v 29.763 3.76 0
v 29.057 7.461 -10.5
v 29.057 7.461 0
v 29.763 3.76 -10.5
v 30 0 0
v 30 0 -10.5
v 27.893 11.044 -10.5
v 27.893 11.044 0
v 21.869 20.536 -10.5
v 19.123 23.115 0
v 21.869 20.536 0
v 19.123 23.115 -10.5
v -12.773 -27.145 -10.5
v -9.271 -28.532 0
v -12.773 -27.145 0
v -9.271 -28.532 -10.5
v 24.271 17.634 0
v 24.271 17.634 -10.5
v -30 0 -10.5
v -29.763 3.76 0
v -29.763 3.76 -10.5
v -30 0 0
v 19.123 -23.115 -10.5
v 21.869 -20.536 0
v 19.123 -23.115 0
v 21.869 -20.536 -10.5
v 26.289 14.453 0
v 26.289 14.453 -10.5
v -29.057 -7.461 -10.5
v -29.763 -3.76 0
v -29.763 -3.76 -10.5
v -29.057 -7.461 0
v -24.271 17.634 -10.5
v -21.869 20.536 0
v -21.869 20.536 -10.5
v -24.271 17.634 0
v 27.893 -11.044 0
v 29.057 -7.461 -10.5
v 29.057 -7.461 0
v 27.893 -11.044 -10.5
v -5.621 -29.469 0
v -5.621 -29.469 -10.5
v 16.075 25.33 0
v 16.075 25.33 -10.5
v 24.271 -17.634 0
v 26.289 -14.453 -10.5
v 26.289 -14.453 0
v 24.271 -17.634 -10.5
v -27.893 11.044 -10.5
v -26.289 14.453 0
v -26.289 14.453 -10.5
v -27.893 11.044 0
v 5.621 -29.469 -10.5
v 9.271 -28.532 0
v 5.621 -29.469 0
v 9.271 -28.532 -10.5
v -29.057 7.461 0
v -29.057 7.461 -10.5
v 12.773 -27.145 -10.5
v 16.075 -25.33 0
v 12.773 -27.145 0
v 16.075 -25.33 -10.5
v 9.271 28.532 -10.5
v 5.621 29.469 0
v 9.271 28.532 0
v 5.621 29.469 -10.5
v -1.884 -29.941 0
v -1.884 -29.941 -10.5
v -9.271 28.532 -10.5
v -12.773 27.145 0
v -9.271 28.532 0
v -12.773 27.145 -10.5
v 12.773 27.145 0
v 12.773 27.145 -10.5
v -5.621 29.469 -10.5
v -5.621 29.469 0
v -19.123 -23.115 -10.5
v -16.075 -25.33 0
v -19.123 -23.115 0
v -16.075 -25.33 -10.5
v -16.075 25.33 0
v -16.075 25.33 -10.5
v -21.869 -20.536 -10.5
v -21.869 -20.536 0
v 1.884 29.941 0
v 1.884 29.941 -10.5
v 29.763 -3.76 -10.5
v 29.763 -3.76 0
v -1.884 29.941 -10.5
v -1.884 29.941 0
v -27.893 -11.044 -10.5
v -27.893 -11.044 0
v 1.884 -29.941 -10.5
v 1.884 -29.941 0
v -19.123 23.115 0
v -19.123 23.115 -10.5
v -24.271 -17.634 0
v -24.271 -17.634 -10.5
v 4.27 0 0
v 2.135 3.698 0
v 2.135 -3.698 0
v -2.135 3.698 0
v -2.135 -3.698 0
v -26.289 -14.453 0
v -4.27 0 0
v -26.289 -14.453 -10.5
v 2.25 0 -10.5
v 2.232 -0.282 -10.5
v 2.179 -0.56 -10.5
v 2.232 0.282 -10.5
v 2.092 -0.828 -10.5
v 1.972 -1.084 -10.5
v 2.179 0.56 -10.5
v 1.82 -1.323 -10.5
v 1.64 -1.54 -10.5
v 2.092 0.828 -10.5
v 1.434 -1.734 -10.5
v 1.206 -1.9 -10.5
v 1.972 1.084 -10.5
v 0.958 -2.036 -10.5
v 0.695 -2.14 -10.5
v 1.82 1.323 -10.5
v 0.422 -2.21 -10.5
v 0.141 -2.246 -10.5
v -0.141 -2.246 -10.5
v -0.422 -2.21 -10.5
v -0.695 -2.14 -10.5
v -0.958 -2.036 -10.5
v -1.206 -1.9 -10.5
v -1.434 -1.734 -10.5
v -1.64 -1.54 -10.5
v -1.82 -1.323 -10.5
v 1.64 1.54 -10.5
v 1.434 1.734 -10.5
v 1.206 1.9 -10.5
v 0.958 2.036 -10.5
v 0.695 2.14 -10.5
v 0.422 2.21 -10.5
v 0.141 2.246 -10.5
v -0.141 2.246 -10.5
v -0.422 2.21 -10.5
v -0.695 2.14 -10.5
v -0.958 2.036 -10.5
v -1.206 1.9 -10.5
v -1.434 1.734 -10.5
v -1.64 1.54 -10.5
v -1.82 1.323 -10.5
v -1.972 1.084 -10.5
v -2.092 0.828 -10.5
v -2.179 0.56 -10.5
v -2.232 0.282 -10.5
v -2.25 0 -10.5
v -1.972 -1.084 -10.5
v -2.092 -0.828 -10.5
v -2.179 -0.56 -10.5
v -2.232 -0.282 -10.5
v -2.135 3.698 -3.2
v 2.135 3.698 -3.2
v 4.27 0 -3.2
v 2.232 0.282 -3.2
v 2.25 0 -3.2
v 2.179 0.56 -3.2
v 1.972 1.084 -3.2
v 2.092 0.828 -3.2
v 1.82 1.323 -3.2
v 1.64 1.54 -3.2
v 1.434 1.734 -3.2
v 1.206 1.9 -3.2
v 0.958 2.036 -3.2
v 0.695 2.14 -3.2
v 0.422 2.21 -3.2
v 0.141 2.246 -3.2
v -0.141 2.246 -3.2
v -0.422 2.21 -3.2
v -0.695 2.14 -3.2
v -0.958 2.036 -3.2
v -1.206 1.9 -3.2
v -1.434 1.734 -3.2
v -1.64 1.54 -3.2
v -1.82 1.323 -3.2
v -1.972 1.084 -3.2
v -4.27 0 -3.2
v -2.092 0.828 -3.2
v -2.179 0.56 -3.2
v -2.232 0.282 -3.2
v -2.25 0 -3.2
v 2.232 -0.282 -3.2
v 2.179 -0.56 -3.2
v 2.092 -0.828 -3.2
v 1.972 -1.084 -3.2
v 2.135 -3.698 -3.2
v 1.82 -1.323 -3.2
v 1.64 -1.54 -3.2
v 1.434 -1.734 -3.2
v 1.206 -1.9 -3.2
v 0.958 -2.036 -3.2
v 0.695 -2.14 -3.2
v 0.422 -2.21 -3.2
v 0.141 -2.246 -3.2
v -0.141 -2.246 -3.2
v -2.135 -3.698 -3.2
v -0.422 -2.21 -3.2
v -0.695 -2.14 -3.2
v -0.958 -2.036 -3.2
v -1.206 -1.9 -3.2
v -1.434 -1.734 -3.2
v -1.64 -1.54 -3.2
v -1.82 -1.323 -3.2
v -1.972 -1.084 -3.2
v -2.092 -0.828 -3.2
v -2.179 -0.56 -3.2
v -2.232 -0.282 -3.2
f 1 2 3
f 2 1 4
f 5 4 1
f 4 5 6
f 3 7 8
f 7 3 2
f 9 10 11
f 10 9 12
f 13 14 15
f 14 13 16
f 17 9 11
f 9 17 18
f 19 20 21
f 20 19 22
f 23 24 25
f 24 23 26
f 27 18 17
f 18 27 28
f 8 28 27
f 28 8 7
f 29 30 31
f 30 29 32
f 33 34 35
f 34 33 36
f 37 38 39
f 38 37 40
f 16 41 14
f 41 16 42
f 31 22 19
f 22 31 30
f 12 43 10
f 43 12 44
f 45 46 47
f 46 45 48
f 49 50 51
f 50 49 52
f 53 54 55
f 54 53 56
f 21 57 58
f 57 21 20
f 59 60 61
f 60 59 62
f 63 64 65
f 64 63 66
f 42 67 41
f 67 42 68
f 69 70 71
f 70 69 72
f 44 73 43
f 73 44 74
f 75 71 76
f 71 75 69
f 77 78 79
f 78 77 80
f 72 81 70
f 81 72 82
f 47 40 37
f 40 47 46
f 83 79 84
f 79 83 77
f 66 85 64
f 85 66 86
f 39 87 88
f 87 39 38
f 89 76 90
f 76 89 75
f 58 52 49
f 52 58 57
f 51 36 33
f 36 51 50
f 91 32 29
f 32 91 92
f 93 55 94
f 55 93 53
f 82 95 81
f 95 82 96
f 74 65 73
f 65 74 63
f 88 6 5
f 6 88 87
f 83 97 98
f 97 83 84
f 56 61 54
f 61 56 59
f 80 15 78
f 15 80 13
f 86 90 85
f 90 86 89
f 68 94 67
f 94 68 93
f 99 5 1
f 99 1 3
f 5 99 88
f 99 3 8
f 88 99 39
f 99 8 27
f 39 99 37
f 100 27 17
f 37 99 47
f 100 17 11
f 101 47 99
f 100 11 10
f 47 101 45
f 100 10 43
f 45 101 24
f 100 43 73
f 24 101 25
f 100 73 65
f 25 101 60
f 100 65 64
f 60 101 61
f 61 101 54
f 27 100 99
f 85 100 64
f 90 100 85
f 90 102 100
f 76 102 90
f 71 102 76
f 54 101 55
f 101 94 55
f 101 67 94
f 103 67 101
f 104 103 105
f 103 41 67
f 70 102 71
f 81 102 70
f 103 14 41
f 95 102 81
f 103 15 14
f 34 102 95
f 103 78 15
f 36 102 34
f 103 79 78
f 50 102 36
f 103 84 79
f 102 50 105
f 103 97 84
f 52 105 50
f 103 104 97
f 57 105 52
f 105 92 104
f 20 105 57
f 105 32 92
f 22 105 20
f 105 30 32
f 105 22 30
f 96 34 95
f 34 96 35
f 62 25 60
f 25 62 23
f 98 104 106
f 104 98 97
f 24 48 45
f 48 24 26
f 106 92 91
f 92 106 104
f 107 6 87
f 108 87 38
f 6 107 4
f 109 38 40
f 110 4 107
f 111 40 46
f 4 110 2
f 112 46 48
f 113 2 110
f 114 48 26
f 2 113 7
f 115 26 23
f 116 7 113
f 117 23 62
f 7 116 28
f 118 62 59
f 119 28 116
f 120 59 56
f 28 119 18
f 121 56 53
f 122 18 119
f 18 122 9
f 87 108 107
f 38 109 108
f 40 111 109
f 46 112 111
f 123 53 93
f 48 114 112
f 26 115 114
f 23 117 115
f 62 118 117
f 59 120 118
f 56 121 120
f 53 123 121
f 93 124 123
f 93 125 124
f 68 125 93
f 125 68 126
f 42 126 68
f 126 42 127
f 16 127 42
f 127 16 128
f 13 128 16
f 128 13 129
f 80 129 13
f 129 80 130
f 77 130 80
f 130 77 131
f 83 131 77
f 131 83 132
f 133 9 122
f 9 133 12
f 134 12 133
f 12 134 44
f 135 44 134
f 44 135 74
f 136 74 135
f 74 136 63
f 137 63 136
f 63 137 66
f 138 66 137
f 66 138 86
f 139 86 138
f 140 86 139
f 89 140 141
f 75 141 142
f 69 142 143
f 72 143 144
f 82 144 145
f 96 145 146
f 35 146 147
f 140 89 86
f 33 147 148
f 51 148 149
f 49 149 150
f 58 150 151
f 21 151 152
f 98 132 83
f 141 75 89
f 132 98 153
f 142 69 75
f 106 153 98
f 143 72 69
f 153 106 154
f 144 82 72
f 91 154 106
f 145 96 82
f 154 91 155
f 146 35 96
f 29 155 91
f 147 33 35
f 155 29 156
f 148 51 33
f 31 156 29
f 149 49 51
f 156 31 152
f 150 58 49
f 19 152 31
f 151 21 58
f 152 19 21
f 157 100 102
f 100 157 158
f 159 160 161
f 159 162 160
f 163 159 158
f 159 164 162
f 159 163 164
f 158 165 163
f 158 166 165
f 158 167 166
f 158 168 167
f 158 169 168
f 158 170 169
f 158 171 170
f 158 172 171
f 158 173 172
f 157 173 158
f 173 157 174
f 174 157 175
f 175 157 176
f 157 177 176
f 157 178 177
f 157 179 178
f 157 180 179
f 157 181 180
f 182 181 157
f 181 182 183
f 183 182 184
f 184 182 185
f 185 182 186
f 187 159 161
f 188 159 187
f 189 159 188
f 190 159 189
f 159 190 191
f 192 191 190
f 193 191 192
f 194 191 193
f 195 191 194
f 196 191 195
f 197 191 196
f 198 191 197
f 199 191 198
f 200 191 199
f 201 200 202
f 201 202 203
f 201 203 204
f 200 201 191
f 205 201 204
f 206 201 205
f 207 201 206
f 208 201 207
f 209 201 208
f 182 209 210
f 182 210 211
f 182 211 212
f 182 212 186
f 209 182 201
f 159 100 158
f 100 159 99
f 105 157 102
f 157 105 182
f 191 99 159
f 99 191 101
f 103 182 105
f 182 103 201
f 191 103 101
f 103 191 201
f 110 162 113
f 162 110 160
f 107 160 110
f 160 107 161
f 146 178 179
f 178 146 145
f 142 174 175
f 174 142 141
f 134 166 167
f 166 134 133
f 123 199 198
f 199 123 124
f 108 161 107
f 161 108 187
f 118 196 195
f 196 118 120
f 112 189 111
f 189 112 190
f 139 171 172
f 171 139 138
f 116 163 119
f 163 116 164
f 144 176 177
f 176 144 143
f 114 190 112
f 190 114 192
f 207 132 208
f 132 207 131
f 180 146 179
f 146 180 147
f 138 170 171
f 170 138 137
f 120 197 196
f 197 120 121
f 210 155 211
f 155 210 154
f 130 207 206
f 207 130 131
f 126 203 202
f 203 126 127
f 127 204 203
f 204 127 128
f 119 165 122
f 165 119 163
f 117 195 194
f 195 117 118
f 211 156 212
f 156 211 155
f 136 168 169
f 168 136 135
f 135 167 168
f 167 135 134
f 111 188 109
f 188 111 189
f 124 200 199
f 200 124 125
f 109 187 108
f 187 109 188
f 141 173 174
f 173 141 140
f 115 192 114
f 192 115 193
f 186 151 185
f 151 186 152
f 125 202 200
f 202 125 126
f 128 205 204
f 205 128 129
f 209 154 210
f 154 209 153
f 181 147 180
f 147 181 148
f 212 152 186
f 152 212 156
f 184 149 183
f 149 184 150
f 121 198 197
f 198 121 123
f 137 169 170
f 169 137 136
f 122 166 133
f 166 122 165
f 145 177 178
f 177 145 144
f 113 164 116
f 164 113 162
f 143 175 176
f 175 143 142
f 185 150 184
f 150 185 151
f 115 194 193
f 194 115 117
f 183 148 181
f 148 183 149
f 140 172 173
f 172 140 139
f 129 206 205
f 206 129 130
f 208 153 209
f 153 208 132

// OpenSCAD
$fn = 50;


difference() {
	union() {
		translate(v = [0, 0, -10.5000000000]) {
			cylinder(h = 10.5000000000, r = 30.0000000000);
		}
		translate(v = [0, 0, -9.0000000000]) {
			cylinder(h = 9, r = 2.8750000000);
		}
	}
	union() {
		translate(v = [0, 0, 0]) {
			rotate(a = [0, 0, 0]) {
				difference() {
					union() {
						translate(v = [0, 0, -3.2000000000]) {
							linear_extrude(height = 3.2000000000) {
								polygon(points = [[4.2698000000, 0.0000000000], [2.1349000000, 3.6977552691], [-2.1349000000, 3.6977552691], [-4.2698000000, 0.0000000000], [-2.1349000000, -3.6977552691], [2.1349000000, -3.6977552691]]);
							}
						}
					}
					union();
				}
			}
		}
		#translate(v = [0, 0, -100.0000000000]) {
			cylinder(h = 200, r = 2.2500000000);
		}
	}
}
